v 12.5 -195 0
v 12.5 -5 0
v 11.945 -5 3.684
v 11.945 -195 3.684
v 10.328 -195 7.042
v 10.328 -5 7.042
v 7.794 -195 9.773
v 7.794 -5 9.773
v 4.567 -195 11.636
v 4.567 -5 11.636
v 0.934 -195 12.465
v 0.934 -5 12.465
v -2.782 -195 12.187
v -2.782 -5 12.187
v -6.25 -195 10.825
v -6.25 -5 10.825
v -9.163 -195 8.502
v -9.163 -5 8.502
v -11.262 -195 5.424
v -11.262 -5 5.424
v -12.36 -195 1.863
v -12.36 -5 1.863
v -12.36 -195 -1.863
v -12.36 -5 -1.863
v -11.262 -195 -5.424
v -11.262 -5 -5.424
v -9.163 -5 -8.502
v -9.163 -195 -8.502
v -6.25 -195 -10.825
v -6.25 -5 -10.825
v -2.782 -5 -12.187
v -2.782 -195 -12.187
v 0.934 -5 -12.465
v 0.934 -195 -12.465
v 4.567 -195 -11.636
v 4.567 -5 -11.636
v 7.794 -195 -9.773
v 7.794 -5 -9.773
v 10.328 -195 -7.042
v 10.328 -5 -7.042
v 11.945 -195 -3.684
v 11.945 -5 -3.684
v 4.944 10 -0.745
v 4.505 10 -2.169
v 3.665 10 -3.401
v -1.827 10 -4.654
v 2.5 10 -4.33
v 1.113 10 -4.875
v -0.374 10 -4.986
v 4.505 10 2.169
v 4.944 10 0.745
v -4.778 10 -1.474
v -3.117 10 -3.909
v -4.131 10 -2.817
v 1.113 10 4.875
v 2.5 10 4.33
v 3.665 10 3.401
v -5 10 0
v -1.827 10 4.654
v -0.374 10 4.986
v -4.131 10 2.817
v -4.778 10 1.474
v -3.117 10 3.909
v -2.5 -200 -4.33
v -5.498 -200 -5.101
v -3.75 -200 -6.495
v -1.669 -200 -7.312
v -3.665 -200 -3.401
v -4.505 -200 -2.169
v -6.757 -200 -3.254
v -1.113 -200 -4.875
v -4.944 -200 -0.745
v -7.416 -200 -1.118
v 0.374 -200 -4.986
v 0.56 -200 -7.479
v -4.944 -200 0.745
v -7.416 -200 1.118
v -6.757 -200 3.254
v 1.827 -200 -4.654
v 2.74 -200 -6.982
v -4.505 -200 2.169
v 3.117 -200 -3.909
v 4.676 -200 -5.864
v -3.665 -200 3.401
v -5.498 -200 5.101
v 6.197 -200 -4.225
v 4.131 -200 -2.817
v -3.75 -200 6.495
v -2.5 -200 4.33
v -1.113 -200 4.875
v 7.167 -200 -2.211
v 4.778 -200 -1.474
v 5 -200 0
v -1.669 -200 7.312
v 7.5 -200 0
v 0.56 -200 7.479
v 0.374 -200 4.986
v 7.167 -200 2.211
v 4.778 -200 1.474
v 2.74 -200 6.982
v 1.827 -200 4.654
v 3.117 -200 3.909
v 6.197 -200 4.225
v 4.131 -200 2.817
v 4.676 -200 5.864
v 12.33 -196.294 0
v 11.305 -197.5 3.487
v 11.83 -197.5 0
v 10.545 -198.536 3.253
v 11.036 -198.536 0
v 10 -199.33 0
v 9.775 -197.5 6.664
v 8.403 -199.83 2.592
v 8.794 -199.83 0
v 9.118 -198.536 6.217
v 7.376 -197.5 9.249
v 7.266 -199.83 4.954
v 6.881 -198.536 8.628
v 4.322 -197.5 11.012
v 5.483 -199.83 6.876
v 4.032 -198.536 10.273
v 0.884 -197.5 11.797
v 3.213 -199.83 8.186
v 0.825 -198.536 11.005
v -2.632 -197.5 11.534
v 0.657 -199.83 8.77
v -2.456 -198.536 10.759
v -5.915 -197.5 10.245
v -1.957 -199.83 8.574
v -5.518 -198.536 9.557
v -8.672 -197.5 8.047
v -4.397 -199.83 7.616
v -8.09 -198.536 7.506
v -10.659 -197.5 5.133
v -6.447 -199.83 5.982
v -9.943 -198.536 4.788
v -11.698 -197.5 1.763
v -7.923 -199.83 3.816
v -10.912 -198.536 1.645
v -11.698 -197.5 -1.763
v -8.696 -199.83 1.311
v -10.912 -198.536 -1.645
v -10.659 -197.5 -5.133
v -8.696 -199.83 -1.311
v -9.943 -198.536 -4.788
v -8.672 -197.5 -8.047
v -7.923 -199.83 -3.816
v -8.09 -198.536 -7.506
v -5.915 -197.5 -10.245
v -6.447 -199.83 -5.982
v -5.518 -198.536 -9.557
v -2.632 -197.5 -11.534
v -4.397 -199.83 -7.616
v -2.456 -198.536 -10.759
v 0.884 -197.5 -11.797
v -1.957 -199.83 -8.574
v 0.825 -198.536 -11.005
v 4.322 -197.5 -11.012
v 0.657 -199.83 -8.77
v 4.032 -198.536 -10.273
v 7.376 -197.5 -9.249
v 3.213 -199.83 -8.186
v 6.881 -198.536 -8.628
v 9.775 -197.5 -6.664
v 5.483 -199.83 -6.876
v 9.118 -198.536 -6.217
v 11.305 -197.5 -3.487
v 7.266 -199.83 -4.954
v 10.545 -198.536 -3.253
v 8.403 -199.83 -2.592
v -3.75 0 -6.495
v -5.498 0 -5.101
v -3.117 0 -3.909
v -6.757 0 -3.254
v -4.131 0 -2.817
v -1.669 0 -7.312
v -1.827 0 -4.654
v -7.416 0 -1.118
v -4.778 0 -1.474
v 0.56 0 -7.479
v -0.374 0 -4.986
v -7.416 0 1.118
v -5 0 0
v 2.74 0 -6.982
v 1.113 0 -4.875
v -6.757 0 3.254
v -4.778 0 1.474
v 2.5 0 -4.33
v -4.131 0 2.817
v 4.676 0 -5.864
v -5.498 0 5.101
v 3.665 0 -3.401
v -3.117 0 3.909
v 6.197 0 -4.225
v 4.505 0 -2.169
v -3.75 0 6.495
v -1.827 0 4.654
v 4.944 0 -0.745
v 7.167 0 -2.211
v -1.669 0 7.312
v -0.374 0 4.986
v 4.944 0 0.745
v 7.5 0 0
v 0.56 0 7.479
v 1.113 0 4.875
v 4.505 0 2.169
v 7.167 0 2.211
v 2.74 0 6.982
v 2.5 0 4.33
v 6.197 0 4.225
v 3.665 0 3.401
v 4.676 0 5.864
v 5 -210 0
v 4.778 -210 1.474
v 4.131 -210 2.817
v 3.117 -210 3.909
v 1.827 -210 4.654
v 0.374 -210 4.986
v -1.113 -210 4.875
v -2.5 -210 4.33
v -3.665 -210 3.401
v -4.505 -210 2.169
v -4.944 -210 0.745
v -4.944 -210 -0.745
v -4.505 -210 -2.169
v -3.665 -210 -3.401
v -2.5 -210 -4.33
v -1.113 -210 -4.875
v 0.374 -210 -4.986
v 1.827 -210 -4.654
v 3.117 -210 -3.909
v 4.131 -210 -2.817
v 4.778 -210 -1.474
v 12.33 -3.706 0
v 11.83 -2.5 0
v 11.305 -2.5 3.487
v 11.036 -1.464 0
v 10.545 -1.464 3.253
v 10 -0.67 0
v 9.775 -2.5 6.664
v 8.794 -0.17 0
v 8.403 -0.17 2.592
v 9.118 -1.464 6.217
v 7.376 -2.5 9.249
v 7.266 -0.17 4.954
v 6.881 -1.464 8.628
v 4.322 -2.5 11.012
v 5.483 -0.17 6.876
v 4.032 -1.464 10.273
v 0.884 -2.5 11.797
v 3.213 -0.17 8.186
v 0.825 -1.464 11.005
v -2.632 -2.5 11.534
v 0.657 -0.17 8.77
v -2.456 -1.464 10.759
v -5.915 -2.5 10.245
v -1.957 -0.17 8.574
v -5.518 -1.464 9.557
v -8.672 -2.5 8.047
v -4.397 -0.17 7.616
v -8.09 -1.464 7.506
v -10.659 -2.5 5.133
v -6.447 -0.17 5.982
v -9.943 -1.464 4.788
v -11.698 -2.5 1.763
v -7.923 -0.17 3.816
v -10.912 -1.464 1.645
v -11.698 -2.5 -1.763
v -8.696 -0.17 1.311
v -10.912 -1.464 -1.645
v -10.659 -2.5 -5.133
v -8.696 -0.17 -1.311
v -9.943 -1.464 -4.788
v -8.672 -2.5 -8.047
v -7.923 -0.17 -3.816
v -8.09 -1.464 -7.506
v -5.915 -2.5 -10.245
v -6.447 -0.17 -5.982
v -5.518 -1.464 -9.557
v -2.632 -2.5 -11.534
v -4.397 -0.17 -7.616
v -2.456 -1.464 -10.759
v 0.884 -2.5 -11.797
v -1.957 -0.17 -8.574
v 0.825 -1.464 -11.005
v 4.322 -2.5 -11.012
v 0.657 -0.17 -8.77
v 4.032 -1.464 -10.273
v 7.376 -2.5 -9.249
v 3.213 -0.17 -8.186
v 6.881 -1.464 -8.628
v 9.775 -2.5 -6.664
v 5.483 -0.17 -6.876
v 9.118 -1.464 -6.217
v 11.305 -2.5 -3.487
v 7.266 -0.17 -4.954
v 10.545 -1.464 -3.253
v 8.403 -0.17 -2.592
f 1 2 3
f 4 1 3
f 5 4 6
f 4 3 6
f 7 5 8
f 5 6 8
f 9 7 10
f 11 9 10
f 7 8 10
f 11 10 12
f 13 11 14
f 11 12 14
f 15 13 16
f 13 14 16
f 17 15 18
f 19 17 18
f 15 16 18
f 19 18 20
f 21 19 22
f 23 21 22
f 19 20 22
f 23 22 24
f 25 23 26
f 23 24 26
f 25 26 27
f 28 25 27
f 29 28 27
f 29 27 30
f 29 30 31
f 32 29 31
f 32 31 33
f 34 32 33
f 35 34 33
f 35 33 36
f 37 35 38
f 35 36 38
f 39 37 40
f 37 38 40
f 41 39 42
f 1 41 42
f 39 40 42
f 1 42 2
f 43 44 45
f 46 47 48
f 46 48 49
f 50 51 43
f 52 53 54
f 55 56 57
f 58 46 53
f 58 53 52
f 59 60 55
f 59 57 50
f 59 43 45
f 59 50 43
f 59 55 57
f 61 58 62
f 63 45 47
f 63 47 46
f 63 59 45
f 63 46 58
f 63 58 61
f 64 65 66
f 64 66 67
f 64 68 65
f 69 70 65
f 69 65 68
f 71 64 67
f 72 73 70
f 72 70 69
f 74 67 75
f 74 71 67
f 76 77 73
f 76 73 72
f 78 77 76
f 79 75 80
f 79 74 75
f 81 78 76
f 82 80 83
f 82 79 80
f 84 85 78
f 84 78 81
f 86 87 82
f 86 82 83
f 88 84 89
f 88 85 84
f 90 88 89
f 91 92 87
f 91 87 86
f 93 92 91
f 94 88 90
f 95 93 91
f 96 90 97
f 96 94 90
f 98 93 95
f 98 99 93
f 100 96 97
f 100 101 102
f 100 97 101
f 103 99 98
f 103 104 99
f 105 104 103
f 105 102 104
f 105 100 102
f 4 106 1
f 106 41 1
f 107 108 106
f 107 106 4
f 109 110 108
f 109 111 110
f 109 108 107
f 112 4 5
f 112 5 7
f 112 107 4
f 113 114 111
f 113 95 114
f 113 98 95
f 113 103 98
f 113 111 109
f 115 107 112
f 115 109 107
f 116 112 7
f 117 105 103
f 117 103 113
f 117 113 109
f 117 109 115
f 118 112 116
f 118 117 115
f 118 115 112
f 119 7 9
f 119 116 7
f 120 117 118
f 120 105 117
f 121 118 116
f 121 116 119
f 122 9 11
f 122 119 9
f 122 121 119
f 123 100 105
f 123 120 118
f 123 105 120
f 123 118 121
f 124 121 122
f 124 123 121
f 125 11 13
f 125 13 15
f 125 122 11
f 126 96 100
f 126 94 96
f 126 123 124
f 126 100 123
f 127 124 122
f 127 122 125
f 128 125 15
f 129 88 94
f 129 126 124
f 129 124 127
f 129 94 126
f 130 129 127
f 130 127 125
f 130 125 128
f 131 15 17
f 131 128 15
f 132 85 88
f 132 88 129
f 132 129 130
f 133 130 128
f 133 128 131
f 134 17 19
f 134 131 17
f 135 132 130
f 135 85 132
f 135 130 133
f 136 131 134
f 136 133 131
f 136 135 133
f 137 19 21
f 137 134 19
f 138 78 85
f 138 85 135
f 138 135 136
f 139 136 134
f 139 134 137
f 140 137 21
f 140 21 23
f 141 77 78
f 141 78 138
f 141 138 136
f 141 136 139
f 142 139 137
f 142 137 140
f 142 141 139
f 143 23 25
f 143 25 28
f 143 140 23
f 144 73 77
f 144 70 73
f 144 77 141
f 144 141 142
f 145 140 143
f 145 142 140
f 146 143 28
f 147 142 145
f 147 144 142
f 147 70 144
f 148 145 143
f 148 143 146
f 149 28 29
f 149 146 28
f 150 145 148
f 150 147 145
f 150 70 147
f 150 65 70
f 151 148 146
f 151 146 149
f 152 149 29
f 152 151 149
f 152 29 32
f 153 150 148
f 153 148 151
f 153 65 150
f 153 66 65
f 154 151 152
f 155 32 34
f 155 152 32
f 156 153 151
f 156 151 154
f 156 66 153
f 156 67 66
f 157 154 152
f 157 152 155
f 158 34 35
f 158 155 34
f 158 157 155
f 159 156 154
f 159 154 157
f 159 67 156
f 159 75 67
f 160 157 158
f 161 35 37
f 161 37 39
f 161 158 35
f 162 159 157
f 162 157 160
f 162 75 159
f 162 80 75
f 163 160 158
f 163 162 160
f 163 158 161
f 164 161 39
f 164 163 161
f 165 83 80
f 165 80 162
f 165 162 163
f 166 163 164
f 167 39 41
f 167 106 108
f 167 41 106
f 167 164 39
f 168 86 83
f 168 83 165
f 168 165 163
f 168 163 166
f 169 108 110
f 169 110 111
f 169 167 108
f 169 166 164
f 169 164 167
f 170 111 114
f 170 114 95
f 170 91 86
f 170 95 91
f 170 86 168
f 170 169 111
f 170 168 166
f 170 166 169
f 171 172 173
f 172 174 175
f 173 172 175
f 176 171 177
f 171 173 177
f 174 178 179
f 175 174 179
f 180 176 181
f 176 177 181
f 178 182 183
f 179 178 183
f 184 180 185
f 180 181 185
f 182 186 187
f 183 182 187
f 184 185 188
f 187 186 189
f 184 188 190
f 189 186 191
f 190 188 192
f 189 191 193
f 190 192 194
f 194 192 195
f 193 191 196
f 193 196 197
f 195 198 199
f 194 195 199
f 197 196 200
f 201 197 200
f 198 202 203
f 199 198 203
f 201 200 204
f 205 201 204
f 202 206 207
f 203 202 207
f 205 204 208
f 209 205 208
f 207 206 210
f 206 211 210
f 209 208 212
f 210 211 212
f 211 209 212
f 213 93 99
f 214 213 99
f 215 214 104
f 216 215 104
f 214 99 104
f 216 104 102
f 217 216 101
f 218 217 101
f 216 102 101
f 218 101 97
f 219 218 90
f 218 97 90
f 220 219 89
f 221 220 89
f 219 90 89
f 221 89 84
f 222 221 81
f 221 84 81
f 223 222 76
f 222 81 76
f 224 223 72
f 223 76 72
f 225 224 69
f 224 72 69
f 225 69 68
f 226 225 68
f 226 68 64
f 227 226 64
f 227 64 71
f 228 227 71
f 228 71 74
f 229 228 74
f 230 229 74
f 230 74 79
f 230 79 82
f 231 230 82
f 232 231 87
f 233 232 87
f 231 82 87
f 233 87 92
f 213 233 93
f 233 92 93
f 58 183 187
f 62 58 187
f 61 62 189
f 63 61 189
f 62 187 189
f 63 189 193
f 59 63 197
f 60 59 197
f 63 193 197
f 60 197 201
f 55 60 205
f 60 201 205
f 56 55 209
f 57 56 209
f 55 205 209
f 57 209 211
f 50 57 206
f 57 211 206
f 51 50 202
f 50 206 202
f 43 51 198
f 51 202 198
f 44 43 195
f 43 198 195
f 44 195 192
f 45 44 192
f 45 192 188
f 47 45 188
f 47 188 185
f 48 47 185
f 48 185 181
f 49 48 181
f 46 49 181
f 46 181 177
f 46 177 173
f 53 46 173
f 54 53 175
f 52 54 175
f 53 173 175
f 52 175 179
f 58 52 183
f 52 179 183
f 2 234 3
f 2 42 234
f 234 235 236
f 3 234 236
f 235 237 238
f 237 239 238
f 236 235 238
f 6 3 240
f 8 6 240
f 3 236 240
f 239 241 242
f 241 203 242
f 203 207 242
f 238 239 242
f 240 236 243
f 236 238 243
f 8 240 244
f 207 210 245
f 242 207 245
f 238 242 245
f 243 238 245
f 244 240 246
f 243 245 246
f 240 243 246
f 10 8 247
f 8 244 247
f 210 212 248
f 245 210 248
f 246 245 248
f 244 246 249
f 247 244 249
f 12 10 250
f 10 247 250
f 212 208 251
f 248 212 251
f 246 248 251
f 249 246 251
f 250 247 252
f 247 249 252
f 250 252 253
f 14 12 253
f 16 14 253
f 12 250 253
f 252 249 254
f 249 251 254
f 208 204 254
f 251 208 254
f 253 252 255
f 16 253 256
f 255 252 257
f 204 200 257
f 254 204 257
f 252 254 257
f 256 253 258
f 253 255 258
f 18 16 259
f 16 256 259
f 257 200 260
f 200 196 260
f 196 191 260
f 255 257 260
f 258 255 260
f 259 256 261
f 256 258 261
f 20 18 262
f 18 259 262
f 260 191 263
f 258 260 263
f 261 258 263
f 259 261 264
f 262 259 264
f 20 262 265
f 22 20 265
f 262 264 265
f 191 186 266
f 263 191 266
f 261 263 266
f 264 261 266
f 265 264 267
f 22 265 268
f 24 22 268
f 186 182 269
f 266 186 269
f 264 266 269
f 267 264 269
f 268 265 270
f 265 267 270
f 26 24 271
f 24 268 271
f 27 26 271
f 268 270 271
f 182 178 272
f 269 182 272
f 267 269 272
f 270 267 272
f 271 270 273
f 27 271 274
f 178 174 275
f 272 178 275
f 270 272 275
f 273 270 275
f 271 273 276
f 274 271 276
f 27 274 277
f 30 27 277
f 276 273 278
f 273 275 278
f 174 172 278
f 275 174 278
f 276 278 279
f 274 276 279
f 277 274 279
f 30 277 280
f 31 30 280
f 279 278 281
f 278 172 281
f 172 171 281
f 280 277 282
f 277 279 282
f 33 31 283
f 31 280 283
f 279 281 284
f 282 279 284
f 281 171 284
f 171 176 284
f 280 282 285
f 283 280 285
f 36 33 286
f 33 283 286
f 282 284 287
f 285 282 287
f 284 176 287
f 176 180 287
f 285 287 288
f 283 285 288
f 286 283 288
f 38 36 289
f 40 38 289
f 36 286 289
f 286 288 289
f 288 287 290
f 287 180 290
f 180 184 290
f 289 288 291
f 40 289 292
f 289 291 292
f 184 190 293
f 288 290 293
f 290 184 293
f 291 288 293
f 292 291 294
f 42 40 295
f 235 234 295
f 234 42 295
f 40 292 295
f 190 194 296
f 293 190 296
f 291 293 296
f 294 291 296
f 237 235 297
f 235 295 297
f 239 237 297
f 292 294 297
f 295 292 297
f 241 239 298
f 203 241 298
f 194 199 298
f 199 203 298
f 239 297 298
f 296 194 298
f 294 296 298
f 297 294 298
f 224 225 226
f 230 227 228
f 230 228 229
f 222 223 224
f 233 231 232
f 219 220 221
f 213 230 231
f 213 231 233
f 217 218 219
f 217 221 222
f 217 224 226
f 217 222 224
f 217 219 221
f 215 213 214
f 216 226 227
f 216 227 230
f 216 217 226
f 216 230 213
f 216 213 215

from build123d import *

# Parameters (mm, degrees)
F0_R     = 12.5
F1_DEPTH = 200
F2_R     = 5
F3_DEPTH = 10
F4_R     = 5
F5_DEPTH = 10
F6_R     = 5
F7_R     = 5


with BuildPart() as f1:
    # F0 (on Front) → F1 (new body)
    with BuildSketch(Plane.XZ):
        Circle(F0_R)
    extrude(amount=F1_DEPTH)

    # F2 (on face) → F3 (join)
    with BuildSketch(Plane.XZ.offset(200)):
        Circle(F2_R)
    extrude(amount=F3_DEPTH)

    # F4 (on face) → F5 (join)
    with BuildSketch(Plane(origin=(0, 0, 0), x_dir=(-1, 0, 0), z_dir=(0, 1, 0))):
        Circle(F4_R)
    extrude(amount=F5_DEPTH)

    # F6
    f6_edges = [f1.edges().sort_by_distance(p)[0] for p in [
        (-12.5, -200, 0),
    ]]
    fillet(f6_edges, radius=F6_R)

    # F7
    f7_edges = [f1.edges().sort_by_distance(p)[0] for p in [
        (-12.5, 0, 0),
        (11.035534, -198.535534, 0),
        (-12.5, -195, 0),
        (-7.5, -200, 0),
    ]]
    fillet(f7_edges, radius=F7_R)


solid = f1.part
